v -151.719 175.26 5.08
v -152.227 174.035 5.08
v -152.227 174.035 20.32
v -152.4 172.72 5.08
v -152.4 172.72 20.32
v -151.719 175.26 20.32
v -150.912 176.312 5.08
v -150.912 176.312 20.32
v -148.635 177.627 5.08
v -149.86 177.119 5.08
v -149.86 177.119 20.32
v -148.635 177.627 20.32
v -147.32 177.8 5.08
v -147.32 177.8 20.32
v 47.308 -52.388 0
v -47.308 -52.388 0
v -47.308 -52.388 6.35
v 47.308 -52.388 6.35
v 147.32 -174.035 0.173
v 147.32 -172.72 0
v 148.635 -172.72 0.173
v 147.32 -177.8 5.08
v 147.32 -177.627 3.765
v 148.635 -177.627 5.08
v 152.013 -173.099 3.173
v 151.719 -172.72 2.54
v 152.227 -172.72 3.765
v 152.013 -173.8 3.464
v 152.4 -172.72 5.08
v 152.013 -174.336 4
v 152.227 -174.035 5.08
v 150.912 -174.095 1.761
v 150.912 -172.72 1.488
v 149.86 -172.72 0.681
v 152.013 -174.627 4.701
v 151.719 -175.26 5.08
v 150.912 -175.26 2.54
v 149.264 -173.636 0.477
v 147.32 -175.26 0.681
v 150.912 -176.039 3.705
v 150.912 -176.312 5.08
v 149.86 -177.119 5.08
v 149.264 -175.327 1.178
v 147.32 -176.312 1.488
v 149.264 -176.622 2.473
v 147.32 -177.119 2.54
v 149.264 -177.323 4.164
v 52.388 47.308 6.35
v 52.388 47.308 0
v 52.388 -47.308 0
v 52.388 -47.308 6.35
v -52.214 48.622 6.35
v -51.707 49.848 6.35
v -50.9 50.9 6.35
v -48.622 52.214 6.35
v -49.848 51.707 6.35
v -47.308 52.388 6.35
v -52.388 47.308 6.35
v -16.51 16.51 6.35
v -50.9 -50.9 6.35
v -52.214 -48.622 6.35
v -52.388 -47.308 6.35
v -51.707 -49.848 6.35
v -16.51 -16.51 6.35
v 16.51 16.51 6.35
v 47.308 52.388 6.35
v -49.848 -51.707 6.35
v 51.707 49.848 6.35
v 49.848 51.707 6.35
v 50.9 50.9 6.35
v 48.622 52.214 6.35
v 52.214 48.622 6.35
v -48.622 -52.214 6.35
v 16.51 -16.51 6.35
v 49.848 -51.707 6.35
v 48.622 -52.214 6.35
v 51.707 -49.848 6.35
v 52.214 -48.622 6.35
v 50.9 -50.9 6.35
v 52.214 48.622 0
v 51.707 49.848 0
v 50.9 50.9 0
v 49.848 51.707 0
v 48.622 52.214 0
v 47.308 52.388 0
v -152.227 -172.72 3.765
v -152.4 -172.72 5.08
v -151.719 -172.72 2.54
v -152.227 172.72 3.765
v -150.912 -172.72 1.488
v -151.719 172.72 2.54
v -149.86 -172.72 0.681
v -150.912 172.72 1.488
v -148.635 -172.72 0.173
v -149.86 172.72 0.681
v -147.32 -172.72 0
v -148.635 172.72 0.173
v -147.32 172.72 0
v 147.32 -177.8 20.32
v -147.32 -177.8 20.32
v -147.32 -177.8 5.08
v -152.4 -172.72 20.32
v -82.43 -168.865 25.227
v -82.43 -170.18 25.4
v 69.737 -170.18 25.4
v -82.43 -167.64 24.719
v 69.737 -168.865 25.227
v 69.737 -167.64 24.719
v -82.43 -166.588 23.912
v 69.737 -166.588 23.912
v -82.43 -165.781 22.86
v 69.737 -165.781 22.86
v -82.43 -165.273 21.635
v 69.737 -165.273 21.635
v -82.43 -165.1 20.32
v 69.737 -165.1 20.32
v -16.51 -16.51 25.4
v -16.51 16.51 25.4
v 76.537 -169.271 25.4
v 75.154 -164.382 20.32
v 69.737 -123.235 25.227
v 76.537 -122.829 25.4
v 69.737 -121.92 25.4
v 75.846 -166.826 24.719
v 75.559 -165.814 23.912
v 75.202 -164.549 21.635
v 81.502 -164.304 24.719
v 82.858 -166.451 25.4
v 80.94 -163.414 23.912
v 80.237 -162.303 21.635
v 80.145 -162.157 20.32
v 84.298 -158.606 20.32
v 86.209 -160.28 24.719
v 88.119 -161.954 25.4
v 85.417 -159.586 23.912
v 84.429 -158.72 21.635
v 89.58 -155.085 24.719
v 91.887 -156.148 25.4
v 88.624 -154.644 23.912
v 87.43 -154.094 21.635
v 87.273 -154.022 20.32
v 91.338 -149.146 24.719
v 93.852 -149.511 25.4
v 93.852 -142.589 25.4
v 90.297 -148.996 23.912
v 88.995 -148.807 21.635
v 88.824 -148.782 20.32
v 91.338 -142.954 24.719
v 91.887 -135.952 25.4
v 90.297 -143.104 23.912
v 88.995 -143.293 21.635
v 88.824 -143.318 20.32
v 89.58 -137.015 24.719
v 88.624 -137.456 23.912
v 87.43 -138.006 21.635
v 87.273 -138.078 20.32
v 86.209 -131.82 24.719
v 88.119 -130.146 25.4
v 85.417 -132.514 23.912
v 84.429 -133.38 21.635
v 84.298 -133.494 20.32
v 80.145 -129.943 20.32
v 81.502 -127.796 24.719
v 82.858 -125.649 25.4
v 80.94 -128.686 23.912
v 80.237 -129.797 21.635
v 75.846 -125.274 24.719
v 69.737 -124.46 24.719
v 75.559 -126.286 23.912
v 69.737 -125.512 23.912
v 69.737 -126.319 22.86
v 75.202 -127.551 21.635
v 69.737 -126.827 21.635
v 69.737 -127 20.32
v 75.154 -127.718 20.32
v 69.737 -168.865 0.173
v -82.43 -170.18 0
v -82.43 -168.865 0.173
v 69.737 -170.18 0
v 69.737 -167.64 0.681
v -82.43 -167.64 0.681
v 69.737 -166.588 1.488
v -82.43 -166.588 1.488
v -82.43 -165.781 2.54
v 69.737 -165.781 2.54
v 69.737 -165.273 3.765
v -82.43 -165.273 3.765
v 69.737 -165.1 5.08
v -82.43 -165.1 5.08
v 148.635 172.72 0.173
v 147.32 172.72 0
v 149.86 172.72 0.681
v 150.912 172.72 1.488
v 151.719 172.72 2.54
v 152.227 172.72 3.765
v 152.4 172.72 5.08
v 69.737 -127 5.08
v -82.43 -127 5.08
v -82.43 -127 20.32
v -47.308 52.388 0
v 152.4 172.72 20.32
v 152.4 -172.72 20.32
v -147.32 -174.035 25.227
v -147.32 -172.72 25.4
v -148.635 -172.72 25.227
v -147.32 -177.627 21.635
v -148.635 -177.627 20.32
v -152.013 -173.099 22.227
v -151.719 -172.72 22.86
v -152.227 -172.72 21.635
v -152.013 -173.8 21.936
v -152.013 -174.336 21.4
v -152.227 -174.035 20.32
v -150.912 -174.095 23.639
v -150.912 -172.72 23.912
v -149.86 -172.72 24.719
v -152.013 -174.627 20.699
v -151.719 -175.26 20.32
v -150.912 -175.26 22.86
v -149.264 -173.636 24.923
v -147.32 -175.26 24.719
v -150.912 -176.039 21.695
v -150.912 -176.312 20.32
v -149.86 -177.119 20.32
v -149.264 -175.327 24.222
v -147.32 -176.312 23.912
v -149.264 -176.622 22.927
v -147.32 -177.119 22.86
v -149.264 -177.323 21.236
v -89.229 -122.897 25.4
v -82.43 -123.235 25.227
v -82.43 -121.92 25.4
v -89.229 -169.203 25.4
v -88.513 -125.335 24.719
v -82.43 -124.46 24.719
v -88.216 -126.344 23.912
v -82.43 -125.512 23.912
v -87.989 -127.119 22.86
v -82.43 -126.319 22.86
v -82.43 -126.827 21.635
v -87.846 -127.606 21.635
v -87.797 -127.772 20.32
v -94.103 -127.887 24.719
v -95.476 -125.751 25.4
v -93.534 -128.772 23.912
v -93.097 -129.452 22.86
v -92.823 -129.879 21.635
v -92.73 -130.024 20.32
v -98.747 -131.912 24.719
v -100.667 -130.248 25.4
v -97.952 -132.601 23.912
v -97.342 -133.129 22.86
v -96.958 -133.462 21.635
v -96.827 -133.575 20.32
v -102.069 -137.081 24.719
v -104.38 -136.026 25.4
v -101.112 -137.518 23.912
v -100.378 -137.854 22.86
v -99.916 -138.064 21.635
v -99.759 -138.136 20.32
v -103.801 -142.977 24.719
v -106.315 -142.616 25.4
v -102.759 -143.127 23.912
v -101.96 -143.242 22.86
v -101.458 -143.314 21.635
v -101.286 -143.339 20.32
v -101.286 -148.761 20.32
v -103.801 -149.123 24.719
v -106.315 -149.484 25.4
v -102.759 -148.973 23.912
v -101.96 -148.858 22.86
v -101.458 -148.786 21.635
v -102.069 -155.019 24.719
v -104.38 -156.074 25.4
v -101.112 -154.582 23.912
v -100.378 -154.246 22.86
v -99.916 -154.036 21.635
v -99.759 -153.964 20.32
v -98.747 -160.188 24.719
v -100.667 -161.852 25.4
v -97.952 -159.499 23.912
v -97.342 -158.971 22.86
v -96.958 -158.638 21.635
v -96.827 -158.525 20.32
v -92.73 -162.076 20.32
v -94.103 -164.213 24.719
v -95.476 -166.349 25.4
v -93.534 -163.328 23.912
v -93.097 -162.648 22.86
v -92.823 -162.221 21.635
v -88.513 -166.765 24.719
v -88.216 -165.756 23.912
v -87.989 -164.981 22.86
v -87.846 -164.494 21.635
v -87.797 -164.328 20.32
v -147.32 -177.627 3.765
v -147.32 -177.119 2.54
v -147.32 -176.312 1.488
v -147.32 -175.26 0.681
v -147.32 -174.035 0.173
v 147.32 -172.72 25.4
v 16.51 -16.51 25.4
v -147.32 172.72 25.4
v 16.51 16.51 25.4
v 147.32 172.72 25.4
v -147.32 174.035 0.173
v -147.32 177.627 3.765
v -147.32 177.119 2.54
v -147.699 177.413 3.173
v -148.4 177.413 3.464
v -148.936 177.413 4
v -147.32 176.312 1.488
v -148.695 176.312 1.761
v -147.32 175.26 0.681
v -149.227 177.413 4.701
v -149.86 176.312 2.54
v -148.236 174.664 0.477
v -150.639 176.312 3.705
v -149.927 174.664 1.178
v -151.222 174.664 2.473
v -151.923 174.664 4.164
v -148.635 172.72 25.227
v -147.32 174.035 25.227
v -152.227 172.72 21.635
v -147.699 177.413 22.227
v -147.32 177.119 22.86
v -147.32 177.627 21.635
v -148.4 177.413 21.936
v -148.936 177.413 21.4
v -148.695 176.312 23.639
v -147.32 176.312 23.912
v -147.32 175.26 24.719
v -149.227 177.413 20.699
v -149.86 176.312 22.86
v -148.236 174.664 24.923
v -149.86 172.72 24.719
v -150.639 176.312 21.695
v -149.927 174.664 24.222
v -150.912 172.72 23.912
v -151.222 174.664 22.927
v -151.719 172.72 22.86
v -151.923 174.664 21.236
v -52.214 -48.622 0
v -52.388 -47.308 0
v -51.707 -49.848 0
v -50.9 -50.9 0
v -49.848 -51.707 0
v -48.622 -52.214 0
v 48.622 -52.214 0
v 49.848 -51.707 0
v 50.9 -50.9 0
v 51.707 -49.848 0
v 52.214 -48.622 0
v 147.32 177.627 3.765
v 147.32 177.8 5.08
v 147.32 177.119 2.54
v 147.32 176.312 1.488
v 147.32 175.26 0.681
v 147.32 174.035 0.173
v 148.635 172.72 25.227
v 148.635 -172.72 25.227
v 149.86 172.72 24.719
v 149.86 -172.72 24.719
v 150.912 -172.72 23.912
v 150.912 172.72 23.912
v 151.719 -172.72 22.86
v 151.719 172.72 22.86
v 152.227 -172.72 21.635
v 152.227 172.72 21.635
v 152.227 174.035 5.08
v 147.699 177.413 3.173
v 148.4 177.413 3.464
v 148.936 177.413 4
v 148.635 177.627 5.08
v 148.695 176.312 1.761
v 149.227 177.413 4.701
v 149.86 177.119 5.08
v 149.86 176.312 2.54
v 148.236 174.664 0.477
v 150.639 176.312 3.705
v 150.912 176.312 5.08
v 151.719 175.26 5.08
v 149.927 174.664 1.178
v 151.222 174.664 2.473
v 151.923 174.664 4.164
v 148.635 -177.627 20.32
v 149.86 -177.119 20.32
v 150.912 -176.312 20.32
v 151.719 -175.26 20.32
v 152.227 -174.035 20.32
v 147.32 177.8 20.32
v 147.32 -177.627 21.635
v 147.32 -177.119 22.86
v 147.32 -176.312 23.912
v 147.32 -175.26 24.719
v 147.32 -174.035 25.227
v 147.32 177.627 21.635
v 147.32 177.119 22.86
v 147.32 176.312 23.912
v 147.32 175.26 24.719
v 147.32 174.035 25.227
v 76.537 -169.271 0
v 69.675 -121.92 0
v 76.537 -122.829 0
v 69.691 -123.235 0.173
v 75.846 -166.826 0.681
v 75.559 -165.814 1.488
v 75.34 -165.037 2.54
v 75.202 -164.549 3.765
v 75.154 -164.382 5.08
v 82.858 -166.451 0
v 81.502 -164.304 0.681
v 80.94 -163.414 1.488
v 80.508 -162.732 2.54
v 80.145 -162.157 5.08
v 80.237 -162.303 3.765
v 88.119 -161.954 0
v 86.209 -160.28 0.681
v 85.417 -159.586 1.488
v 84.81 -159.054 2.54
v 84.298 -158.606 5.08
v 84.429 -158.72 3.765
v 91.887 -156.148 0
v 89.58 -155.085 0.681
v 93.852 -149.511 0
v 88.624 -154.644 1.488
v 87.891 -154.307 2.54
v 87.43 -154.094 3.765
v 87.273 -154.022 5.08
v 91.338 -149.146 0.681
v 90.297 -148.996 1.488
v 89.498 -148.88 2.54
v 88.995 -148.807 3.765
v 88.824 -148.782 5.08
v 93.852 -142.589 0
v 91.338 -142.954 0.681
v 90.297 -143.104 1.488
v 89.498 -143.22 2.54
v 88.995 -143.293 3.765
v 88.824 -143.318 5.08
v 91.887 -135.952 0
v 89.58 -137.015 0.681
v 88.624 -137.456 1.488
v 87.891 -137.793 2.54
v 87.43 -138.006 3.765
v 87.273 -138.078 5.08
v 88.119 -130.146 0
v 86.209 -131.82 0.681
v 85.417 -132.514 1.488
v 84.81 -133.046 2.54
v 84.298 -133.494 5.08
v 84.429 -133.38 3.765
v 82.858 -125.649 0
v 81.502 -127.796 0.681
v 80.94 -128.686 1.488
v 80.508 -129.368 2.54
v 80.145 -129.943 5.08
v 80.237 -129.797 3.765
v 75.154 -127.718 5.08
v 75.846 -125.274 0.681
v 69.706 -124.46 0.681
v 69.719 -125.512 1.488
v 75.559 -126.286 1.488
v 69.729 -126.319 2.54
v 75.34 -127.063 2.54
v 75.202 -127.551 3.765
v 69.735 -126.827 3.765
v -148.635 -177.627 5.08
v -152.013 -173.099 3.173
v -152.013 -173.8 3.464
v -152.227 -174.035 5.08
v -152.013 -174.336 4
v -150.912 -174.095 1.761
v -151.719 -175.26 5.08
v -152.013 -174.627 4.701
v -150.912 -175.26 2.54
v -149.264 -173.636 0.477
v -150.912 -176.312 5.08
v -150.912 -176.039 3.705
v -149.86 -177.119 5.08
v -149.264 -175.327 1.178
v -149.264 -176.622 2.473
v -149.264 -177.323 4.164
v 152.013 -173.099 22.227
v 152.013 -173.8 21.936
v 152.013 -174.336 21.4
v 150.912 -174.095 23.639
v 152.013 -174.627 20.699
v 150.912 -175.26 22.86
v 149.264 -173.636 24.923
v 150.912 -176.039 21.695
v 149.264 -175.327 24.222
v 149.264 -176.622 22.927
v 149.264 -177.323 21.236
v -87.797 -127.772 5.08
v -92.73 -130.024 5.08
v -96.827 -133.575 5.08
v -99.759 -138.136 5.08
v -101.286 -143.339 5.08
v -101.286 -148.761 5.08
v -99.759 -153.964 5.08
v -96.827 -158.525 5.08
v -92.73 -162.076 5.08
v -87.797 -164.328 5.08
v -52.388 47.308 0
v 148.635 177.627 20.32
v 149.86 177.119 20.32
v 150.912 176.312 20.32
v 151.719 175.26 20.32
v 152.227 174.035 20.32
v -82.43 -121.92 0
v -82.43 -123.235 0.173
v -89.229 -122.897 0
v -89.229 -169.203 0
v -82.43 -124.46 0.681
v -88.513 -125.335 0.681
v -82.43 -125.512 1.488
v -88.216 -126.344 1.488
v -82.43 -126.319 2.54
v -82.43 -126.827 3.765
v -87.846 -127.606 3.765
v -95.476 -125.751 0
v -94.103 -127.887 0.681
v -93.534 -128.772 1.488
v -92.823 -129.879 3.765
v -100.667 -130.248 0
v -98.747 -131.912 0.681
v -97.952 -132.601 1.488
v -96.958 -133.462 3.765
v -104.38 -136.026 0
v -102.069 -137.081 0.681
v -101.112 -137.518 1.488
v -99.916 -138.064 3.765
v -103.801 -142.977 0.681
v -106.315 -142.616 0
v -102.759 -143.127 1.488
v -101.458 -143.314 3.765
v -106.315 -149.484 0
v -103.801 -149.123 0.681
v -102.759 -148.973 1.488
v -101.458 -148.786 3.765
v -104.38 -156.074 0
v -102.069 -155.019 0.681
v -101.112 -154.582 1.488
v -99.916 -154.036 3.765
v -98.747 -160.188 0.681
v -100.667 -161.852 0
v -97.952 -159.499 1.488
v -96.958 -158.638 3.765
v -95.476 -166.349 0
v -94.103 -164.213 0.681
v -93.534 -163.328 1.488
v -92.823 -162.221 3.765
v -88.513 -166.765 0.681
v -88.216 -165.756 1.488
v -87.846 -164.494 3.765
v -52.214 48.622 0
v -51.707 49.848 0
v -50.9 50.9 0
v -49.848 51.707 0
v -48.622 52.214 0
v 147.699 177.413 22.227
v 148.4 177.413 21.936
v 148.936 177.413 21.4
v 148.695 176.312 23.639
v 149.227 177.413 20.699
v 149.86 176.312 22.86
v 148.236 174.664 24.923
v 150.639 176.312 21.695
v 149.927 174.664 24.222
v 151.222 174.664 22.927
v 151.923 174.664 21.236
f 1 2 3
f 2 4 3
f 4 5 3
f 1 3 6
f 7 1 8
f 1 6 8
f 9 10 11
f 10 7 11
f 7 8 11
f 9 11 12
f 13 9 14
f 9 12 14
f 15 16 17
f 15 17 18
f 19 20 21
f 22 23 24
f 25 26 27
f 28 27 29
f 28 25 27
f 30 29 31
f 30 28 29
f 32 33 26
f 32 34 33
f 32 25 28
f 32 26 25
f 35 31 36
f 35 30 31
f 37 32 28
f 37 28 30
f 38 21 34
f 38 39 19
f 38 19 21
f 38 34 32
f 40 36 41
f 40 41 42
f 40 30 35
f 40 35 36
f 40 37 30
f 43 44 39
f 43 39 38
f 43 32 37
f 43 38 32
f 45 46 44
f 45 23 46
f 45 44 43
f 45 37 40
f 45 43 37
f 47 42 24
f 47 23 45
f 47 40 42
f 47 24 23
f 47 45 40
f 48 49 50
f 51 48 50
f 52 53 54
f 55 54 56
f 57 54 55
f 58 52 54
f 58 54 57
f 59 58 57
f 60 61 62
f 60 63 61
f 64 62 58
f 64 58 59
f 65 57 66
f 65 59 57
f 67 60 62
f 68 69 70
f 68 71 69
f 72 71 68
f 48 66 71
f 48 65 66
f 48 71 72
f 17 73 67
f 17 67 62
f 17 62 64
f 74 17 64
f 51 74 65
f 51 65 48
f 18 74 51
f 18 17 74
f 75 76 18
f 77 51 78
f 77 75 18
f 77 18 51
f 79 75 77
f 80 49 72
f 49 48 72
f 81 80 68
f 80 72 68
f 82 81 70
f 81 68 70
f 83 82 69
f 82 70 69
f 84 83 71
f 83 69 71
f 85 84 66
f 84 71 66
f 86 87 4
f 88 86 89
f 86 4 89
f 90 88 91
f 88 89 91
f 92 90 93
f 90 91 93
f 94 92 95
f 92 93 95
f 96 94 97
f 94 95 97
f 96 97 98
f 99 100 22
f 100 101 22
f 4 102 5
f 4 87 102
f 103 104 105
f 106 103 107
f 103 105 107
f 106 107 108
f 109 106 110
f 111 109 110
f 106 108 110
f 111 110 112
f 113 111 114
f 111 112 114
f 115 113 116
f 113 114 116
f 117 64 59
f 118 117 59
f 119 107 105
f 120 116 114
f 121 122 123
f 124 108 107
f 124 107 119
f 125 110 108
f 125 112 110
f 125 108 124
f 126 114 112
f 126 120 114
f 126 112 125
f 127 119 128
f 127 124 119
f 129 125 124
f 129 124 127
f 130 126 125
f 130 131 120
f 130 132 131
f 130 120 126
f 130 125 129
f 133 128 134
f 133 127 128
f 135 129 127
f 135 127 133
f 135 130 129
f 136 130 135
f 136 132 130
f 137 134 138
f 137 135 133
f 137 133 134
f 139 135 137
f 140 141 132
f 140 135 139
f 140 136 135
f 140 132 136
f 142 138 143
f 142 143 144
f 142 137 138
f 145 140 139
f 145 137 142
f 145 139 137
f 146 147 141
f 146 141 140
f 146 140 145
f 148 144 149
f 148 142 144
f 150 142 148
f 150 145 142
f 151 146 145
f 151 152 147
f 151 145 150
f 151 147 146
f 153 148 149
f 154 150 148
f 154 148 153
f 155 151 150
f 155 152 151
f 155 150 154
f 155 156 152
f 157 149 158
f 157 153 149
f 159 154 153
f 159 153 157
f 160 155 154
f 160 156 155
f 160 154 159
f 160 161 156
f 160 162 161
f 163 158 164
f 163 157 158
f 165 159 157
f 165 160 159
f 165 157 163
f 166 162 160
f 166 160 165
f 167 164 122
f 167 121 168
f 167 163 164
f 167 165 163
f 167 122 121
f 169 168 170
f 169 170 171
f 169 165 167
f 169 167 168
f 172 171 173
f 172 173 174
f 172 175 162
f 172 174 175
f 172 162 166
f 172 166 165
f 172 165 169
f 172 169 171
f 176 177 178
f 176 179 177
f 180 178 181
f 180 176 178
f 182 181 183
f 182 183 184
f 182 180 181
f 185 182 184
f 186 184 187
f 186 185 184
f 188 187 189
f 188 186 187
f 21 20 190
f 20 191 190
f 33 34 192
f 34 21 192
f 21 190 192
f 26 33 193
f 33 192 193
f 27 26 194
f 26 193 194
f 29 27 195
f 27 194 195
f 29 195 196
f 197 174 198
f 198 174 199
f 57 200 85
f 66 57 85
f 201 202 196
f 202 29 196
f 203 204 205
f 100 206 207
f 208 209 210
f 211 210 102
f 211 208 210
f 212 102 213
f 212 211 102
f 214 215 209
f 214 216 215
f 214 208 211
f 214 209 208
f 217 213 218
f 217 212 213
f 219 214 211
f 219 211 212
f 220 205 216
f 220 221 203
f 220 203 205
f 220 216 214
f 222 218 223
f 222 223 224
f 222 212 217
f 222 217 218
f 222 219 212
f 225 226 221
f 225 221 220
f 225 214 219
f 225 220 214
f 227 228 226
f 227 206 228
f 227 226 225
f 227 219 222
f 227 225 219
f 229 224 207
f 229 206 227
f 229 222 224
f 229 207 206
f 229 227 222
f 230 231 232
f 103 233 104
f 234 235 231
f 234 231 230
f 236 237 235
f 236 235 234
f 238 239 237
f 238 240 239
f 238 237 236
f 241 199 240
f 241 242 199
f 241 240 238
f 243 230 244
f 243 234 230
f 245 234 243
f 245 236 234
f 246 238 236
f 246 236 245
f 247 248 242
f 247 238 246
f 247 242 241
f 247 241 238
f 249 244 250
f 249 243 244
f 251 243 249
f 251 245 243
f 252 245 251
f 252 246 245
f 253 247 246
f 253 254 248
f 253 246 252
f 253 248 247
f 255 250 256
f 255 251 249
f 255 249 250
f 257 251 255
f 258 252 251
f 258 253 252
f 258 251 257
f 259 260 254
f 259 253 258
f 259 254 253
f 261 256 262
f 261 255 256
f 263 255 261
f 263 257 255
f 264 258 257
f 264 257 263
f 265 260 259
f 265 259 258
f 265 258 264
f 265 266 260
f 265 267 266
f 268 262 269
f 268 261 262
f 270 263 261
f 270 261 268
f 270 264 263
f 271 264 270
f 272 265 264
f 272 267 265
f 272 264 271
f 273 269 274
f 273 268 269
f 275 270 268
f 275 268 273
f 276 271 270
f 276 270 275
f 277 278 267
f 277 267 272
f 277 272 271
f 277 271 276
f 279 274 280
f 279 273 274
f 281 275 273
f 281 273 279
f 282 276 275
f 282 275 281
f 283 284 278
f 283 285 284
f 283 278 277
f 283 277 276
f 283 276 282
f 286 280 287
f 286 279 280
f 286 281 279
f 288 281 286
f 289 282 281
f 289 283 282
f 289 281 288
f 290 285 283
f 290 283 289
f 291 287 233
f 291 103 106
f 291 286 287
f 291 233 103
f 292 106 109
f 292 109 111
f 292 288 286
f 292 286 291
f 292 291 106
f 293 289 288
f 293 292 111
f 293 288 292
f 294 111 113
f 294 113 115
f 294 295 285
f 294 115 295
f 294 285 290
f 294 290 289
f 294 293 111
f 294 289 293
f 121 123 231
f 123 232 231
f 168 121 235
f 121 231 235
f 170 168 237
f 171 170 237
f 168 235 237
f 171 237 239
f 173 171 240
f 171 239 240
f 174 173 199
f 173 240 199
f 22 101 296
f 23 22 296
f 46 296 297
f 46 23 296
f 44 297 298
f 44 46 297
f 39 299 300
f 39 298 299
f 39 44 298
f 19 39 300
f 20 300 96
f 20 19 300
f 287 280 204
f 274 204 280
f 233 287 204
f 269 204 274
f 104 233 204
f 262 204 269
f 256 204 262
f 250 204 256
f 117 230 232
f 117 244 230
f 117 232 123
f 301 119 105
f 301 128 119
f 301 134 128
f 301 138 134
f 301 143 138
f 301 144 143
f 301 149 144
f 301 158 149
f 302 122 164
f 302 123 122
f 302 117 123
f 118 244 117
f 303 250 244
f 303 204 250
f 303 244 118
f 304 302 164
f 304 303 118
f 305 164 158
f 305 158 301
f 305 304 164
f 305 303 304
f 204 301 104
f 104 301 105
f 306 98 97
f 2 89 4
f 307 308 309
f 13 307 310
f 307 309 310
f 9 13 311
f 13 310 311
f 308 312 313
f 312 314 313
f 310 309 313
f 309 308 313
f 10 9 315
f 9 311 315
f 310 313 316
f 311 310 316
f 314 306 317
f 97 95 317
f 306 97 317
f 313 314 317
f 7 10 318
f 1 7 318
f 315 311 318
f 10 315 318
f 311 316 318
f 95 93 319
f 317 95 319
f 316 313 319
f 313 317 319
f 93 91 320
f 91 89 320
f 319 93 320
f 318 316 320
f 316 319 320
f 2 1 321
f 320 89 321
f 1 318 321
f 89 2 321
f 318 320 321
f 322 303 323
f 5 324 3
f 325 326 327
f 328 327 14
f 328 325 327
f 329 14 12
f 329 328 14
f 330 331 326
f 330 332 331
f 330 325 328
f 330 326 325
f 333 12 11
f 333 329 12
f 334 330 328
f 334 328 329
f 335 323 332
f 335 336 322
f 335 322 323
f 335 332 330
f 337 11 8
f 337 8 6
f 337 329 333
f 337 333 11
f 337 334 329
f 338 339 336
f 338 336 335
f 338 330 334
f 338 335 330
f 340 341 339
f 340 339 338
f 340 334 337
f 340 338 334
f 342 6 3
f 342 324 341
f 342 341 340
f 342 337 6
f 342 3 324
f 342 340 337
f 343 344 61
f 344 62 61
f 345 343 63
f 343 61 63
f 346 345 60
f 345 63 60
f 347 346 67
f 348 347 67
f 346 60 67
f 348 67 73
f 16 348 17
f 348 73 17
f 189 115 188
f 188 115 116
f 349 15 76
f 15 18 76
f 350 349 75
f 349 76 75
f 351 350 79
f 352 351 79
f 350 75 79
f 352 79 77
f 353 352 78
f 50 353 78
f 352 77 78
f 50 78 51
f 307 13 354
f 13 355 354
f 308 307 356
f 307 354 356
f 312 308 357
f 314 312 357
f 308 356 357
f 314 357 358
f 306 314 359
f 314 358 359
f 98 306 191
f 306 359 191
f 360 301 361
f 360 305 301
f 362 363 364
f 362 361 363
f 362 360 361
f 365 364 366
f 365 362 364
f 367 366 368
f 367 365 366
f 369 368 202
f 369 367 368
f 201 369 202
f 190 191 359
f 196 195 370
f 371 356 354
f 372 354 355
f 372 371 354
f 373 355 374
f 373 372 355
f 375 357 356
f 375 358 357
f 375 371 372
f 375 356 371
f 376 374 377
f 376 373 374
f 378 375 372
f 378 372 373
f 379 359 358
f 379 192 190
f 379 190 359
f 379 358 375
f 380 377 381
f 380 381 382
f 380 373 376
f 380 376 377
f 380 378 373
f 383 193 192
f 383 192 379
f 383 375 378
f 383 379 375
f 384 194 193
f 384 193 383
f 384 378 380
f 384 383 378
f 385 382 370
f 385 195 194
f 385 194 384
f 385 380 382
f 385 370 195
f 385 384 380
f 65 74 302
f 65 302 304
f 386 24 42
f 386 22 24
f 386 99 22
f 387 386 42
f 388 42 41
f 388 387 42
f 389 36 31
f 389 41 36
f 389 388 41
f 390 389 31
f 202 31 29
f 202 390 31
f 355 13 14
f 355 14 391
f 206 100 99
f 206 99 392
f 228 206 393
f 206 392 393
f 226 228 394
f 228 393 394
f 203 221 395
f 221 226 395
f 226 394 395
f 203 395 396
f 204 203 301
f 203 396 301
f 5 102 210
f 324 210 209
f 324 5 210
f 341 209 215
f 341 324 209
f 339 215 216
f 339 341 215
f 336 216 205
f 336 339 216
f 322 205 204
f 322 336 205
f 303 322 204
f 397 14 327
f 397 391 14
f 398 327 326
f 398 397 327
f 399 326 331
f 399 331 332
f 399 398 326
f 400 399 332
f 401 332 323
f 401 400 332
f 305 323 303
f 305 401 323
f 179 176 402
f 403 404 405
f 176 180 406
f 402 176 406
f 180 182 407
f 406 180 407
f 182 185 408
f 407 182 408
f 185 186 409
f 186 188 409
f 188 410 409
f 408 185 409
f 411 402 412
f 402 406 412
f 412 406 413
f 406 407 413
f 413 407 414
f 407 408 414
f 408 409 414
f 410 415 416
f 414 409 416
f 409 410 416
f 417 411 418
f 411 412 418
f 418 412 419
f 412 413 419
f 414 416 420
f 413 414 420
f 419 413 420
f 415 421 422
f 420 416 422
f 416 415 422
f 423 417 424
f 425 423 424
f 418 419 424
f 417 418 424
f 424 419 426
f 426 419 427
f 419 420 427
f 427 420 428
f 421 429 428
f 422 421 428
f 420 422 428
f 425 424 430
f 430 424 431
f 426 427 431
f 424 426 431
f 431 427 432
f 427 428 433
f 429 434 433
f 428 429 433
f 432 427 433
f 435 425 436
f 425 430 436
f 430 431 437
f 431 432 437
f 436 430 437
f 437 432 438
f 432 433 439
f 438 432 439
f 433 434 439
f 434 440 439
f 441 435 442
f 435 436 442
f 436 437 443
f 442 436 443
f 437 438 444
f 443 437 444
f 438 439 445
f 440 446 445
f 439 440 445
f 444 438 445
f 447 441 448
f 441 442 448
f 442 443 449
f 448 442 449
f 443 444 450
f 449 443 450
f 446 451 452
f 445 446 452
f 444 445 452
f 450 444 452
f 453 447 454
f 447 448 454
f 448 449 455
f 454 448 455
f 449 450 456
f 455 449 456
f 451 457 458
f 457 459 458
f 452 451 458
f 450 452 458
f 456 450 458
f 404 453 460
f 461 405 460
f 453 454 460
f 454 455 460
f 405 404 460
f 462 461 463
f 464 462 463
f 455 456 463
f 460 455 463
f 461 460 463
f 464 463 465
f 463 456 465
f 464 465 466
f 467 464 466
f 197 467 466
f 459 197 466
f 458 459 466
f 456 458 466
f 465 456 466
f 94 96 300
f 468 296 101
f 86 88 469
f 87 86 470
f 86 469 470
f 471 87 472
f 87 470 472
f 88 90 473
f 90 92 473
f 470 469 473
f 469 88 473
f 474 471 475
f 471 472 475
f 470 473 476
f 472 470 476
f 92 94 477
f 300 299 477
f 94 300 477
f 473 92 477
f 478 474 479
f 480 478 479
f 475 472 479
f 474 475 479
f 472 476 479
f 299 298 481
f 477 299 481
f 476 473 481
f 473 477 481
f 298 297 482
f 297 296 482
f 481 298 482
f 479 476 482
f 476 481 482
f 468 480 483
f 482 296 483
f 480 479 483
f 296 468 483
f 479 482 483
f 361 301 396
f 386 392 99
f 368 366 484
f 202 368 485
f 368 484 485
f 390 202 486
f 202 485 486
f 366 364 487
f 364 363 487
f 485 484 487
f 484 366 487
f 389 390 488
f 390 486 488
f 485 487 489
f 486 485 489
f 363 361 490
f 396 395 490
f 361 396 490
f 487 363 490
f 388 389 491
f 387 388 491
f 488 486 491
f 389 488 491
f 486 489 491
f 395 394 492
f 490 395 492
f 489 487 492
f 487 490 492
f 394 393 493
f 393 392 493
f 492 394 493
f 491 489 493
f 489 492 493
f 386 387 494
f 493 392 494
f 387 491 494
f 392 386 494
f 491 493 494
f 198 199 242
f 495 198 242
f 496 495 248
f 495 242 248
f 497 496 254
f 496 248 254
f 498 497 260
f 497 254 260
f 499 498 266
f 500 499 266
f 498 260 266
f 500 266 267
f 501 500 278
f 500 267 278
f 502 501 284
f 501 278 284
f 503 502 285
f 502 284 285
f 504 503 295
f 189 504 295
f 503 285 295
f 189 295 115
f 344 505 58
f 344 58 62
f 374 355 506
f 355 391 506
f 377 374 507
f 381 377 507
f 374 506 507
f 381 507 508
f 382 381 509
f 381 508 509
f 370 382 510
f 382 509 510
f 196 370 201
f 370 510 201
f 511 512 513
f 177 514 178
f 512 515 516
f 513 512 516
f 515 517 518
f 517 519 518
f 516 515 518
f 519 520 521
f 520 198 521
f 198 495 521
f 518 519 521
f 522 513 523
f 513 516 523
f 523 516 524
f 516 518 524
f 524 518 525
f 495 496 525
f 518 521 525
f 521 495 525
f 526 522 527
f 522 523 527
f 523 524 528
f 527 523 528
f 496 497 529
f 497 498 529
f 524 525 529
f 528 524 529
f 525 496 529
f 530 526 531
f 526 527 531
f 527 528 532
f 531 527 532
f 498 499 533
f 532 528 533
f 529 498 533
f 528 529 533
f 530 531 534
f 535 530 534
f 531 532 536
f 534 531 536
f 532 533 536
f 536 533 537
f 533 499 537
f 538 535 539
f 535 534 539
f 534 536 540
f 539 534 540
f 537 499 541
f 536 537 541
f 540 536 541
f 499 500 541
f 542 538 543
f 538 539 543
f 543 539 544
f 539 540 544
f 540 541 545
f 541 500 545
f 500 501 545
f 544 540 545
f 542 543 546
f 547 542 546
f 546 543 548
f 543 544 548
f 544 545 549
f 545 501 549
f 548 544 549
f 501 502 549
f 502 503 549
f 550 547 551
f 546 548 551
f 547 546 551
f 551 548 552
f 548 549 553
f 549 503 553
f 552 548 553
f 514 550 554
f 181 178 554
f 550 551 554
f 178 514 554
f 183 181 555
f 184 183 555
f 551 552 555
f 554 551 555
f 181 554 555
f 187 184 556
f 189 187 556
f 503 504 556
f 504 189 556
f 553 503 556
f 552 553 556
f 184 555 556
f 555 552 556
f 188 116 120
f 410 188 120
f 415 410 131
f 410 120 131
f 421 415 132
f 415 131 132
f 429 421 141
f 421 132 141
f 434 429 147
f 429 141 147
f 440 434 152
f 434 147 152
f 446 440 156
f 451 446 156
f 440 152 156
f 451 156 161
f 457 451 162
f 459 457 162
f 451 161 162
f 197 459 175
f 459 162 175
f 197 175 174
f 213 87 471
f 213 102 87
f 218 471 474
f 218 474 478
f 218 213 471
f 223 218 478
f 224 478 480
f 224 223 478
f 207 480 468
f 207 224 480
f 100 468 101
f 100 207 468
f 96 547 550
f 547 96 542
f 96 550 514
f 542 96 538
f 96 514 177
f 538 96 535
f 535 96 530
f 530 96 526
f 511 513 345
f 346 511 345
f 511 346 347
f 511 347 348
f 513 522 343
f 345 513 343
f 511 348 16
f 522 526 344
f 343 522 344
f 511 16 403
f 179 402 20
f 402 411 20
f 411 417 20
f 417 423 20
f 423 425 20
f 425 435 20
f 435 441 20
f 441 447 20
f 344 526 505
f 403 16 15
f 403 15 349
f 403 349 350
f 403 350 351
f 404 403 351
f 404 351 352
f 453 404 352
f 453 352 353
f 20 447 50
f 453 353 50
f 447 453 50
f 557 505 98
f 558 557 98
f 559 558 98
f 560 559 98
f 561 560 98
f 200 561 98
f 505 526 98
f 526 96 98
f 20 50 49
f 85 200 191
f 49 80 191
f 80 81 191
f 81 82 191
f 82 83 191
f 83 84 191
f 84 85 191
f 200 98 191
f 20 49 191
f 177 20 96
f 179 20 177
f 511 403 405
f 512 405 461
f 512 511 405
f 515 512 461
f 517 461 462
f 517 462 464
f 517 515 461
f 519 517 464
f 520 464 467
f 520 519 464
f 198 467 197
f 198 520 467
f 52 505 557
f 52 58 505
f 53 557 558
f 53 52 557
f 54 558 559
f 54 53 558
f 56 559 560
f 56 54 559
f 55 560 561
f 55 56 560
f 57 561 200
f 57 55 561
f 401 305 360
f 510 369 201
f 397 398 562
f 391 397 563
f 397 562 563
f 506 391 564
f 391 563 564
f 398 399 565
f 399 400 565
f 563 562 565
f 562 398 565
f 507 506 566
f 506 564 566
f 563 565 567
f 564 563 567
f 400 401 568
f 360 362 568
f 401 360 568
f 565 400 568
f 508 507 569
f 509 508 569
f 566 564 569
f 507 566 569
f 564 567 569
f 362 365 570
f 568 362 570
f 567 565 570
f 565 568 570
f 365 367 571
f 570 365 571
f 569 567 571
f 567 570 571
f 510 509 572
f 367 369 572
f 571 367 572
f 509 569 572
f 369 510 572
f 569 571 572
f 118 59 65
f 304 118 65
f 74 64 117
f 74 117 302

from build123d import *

# Parameters (mm, degrees)
F0_W     = 304.8
F0_H     = 355.6
F0_W_2   = 33.02
F0_H_2   = 33.02
F1_DEPTH = 25.4
F3_DEPTH = 25.401
F4_R     = 5.08
F5_W     = 104.775
F5_H     = 104.775
F6_DEPTH = 6.35
F7_R     = 5.08


with BuildPart() as f1:
    # F0 (on Top) → F1 (new body)
    with BuildSketch(Plane.XY):
        Rectangle(F0_W, F0_H)
        Rectangle(F0_W_2, F0_H_2, mode=Mode.SUBTRACT)
    extrude(amount=F1_DEPTH)

    # F2 (on face) → F3 (cut, through all)
    with BuildSketch(Plane.XY.offset(25.4)):
        with BuildLine():
            Line((69.737374, -127), (-82.430303, -127))
            ThreePointArc((-82.430303, -127), (-101.480303, -146.05), (-82.430303, -165.1))
            Line((-82.430303, -165.1), (69.737374, -165.1))
            ThreePointArc((69.737374, -165.1), (89.021114, -146.05), (69.737374, -127))
        make_face()
    extrude(amount=-F3_DEPTH, mode=Mode.SUBTRACT)

    # F4
    f4_edges = [f1.edges().sort_by_distance(p)[0] for p in [
        (0, -177.8, 25.4),
        (0, -177.8, 0),
        (152.4, 0, 25.4),
        (152.4, 0, 0),
        (-152.4, 0, 25.4),
        (-152.4, 0, 0),
        (0, 177.8, 0),
        (-6.346464, -127, 25.4),
        (-101.480303, -146.05, 25.4),
        (89.021114, -146.05, 25.4),
        (-6.346464, -165.1, 0),
        (89.021114, -146.05, 0),
        (0, 177.8, 25.4),
        (152.4, 177.8, 12.7),
        (-152.4, 177.8, 12.7),
        (-152.4, -177.8, 12.7),
        (152.4, -177.8, 12.7),
    ]]
    fillet(f4_edges, radius=F4_R)

    # F5 (on face) → F6 (cut)
    with BuildSketch(Plane(origin=(0, 0, 0), x_dir=(1, 0, 0), z_dir=(0, 0, -1))):
        Rectangle(F5_W, F5_H)
    extrude(amount=-F6_DEPTH, mode=Mode.SUBTRACT)

    # F7
    f7_edges = [f1.edges().sort_by_distance(p)[0] for p in [
        (-52.3875, -52.3875, 3.175),
        (52.3875, -52.3875, 3.175),
        (-52.3875, 52.3875, 3.175),
        (52.3875, 52.3875, 3.175),
    ]]
    fillet(f7_edges, radius=F7_R)


solid = f1.part
